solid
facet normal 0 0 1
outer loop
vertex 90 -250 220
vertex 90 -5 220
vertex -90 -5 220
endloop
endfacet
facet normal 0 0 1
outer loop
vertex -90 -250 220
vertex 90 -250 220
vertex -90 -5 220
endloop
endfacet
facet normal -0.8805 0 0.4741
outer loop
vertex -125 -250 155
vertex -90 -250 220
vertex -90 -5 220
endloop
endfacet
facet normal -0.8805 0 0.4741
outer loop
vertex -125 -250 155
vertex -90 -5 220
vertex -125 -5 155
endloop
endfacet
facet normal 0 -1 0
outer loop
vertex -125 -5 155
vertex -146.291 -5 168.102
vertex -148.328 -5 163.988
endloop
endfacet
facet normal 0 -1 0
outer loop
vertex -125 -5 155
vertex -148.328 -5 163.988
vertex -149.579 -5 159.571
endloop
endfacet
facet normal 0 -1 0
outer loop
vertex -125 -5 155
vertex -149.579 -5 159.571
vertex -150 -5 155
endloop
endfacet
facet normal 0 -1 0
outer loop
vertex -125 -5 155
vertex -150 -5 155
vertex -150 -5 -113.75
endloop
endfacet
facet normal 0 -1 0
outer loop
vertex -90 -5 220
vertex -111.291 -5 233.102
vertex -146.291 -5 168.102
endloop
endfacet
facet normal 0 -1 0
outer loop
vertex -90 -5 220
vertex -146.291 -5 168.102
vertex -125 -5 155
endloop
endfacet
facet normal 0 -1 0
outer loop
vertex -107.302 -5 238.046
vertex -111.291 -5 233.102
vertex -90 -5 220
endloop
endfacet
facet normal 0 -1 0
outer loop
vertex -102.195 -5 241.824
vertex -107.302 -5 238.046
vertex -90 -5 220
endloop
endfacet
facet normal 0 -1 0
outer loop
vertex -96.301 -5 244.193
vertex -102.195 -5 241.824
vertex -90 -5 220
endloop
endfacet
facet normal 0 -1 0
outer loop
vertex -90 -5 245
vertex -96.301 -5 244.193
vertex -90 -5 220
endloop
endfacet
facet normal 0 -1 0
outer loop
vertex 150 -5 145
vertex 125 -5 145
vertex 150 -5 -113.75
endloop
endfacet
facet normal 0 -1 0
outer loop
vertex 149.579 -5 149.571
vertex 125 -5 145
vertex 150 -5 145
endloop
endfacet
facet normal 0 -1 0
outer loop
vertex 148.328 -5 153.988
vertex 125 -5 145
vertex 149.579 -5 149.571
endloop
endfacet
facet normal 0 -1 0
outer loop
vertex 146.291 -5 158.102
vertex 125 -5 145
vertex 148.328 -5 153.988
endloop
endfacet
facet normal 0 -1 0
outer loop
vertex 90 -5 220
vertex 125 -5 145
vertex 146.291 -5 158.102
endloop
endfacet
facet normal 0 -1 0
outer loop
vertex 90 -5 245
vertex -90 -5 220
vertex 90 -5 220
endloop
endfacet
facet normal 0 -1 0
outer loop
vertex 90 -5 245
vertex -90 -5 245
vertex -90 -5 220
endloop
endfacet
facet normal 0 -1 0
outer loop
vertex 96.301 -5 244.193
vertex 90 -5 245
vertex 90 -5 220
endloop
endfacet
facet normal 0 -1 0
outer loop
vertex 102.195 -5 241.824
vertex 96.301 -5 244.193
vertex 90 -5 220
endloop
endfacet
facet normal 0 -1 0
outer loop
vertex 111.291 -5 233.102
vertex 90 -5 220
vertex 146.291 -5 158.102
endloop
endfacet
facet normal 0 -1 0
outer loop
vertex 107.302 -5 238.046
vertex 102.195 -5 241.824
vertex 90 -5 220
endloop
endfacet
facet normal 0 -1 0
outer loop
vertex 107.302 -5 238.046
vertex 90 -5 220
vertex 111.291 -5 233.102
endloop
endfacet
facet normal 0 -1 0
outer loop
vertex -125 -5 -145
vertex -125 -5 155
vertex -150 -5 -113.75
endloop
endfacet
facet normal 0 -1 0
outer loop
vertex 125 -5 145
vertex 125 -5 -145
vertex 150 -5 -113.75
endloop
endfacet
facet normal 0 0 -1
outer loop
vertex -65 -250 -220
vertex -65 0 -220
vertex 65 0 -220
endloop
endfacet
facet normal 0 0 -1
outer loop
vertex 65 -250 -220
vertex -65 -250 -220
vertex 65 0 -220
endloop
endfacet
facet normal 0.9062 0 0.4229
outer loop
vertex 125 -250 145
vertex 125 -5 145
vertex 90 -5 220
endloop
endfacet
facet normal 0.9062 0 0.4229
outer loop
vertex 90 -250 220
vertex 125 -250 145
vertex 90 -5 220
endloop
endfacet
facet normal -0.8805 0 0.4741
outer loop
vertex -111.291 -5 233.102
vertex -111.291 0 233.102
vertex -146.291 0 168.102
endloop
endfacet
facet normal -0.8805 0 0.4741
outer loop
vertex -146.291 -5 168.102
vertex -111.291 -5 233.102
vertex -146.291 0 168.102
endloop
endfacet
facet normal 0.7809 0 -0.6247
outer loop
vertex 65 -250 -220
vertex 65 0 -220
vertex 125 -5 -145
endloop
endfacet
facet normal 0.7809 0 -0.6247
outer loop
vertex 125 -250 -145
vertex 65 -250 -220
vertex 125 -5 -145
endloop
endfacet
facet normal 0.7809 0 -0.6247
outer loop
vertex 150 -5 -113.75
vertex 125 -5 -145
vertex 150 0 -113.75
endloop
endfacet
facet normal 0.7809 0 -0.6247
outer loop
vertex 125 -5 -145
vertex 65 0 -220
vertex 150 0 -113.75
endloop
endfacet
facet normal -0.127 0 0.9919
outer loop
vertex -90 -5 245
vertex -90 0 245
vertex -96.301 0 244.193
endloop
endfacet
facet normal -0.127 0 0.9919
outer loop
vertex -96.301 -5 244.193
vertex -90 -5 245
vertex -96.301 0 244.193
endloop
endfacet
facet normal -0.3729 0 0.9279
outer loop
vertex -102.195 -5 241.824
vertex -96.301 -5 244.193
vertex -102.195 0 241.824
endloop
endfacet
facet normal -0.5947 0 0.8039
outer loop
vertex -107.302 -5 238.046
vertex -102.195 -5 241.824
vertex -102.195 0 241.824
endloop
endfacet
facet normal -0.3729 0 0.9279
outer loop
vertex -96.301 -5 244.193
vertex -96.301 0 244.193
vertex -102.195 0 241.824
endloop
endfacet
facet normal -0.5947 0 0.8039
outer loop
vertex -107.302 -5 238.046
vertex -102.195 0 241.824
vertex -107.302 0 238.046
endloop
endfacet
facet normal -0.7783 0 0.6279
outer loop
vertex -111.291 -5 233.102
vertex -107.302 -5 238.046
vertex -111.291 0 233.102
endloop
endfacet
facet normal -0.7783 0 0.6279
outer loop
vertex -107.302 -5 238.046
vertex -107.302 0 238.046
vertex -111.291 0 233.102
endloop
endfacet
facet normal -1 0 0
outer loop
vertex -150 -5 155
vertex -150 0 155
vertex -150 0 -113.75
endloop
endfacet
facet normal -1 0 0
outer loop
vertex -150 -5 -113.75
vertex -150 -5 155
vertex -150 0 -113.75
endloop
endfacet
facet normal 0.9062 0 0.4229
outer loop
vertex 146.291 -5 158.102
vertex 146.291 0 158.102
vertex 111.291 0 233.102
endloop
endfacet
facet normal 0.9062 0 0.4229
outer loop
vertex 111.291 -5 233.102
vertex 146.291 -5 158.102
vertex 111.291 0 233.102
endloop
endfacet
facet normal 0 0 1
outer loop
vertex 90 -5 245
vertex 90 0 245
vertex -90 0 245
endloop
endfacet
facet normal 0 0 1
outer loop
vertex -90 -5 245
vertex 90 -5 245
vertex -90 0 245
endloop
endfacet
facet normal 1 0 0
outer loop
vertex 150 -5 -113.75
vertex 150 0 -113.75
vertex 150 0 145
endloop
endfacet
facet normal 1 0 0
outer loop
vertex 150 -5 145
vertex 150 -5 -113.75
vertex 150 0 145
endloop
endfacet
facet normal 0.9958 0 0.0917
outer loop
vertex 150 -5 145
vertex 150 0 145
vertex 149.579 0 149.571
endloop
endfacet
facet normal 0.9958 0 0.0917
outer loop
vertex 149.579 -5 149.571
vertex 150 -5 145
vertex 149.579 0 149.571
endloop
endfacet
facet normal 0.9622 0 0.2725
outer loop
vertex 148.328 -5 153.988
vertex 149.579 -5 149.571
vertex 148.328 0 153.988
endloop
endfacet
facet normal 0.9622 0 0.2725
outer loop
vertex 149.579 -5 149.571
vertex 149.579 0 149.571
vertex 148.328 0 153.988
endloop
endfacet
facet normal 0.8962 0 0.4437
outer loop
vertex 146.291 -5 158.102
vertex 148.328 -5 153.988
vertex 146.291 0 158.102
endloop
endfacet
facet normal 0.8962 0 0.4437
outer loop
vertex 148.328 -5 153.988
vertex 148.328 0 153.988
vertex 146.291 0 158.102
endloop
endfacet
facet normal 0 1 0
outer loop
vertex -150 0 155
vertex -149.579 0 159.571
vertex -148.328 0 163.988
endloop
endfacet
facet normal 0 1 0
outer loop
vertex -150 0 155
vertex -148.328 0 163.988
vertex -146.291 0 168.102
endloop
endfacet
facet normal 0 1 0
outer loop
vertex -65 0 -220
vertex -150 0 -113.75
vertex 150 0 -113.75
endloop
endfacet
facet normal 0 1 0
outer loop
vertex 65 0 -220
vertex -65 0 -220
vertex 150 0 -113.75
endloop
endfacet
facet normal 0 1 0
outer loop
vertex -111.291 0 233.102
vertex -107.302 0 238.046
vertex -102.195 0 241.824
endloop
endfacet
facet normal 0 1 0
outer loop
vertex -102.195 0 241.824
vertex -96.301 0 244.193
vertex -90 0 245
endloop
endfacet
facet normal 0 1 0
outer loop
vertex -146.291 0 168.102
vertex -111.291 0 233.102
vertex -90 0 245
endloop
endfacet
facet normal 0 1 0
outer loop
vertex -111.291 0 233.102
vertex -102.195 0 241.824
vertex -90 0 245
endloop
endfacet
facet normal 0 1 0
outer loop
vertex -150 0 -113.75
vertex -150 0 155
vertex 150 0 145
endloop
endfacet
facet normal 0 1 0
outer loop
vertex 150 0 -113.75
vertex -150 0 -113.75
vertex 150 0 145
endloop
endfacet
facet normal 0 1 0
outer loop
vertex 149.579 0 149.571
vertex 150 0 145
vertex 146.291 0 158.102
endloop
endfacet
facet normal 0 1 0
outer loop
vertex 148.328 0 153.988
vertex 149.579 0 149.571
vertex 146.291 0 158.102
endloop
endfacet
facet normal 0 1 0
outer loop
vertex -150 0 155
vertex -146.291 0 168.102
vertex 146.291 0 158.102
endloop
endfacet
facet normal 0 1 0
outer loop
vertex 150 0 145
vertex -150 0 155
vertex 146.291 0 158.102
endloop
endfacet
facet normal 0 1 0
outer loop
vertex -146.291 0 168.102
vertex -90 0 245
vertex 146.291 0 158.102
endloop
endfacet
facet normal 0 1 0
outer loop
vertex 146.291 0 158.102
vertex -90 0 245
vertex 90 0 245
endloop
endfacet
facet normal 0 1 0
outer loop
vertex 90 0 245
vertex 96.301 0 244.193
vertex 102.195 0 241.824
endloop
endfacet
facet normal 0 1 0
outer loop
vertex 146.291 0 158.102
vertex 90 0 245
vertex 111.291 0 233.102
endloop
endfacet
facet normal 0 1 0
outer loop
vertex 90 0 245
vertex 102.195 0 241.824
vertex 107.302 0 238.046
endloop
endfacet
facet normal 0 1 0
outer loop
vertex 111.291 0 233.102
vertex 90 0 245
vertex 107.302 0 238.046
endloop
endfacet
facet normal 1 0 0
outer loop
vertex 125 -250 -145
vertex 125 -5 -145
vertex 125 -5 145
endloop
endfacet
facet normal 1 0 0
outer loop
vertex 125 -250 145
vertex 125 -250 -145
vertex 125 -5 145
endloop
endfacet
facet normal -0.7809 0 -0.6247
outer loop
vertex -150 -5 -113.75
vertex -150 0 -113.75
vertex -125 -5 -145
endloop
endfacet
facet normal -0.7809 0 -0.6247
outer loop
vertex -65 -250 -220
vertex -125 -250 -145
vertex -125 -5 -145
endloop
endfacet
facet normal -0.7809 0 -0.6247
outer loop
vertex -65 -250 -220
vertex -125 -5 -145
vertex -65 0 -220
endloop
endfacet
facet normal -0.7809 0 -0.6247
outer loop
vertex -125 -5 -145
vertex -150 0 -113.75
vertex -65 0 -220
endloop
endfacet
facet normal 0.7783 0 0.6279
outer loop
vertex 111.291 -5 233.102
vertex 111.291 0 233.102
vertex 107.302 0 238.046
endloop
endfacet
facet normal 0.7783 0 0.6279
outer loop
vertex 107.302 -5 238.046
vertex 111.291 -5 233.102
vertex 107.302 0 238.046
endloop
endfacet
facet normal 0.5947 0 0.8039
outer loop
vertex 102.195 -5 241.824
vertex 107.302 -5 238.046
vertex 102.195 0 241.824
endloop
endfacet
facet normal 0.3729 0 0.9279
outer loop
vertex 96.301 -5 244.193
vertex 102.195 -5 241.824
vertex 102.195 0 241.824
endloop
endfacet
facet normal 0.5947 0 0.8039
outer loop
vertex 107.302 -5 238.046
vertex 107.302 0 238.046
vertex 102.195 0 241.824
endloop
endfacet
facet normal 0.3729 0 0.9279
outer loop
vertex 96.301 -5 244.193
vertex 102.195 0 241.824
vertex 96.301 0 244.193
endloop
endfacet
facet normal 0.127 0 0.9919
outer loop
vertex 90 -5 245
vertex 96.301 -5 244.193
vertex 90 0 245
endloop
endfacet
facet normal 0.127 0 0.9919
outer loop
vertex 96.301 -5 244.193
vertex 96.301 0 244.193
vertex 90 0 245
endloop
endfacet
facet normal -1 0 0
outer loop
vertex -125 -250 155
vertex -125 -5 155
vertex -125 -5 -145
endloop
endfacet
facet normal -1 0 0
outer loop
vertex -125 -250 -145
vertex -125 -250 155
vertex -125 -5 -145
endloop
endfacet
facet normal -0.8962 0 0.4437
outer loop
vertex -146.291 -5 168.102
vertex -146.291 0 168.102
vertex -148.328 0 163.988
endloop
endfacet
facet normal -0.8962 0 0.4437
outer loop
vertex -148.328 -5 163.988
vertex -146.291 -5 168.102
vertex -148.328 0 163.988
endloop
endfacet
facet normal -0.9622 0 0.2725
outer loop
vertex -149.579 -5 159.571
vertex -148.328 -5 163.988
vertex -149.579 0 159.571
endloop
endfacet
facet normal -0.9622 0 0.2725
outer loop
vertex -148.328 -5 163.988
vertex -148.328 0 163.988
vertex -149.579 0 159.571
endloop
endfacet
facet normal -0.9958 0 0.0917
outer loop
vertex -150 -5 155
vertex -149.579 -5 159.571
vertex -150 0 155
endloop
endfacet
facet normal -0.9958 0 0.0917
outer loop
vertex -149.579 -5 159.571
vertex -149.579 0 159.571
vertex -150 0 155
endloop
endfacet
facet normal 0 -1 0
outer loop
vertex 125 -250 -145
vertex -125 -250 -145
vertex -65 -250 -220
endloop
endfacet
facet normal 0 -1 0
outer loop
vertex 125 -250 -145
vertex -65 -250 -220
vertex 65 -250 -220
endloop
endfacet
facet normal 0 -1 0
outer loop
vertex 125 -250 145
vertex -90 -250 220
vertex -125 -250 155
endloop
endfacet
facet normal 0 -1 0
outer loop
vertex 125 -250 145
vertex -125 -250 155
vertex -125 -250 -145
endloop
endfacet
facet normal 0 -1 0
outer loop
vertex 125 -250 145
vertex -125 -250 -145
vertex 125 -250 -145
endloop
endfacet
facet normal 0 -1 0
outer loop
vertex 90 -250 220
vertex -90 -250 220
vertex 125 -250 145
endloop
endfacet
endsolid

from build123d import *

# Parameters (mm, degrees)
F1_DEPTH = 250
F2_DEPTH = 5


with BuildPart() as f1:
    # F0 (on Front) → F1 (new body)
    with BuildSketch(Plane.XZ):
        Polygon((-90, 220), (-125, 155), (-125, -145), (-65, -220), (65, -220), (125, -145), (125, 145), (90, 220), align=None)
    extrude(amount=F1_DEPTH)

    # F0 (on Front) → F2 (join)
    with BuildSketch(Plane.XZ):
        with BuildLine():
            Line((-125, -145), (-125, 155))
            Line((-125, 155), (-90, 220))
            Line((-90, 220), (90, 220))
            Line((90, 220), (125, 145))
            Line((125, 145), (125, -145))
            Line((125, -145), (150, -113.75))
            Line((150, -113.75), (150, 145))
            ThreePointArc((150, 145), (149.055004, 151.808581), (146.291458, 158.102436))
            Line((146.291458, 158.102436), (111.291458, 233.102436))
            ThreePointArc((111.291458, 233.102436), (102.195063, 241.82385), (90, 245))
            Line((90, 245), (-90, 245))
            ThreePointArc((-90, 245), (-102.195063, 241.82385), (-111.291458, 233.102436))
            Line((-111.291458, 233.102436), (-146.291458, 168.102436))
            ThreePointArc((-146.291458, 168.102436), (-149.055004, 161.808581), (-150, 155))
            Line((-150, 155), (-150, -113.75))
            Line((-150, -113.75), (-125, -145))
        make_face()
    extrude(amount=F2_DEPTH)


solid = f1.part
